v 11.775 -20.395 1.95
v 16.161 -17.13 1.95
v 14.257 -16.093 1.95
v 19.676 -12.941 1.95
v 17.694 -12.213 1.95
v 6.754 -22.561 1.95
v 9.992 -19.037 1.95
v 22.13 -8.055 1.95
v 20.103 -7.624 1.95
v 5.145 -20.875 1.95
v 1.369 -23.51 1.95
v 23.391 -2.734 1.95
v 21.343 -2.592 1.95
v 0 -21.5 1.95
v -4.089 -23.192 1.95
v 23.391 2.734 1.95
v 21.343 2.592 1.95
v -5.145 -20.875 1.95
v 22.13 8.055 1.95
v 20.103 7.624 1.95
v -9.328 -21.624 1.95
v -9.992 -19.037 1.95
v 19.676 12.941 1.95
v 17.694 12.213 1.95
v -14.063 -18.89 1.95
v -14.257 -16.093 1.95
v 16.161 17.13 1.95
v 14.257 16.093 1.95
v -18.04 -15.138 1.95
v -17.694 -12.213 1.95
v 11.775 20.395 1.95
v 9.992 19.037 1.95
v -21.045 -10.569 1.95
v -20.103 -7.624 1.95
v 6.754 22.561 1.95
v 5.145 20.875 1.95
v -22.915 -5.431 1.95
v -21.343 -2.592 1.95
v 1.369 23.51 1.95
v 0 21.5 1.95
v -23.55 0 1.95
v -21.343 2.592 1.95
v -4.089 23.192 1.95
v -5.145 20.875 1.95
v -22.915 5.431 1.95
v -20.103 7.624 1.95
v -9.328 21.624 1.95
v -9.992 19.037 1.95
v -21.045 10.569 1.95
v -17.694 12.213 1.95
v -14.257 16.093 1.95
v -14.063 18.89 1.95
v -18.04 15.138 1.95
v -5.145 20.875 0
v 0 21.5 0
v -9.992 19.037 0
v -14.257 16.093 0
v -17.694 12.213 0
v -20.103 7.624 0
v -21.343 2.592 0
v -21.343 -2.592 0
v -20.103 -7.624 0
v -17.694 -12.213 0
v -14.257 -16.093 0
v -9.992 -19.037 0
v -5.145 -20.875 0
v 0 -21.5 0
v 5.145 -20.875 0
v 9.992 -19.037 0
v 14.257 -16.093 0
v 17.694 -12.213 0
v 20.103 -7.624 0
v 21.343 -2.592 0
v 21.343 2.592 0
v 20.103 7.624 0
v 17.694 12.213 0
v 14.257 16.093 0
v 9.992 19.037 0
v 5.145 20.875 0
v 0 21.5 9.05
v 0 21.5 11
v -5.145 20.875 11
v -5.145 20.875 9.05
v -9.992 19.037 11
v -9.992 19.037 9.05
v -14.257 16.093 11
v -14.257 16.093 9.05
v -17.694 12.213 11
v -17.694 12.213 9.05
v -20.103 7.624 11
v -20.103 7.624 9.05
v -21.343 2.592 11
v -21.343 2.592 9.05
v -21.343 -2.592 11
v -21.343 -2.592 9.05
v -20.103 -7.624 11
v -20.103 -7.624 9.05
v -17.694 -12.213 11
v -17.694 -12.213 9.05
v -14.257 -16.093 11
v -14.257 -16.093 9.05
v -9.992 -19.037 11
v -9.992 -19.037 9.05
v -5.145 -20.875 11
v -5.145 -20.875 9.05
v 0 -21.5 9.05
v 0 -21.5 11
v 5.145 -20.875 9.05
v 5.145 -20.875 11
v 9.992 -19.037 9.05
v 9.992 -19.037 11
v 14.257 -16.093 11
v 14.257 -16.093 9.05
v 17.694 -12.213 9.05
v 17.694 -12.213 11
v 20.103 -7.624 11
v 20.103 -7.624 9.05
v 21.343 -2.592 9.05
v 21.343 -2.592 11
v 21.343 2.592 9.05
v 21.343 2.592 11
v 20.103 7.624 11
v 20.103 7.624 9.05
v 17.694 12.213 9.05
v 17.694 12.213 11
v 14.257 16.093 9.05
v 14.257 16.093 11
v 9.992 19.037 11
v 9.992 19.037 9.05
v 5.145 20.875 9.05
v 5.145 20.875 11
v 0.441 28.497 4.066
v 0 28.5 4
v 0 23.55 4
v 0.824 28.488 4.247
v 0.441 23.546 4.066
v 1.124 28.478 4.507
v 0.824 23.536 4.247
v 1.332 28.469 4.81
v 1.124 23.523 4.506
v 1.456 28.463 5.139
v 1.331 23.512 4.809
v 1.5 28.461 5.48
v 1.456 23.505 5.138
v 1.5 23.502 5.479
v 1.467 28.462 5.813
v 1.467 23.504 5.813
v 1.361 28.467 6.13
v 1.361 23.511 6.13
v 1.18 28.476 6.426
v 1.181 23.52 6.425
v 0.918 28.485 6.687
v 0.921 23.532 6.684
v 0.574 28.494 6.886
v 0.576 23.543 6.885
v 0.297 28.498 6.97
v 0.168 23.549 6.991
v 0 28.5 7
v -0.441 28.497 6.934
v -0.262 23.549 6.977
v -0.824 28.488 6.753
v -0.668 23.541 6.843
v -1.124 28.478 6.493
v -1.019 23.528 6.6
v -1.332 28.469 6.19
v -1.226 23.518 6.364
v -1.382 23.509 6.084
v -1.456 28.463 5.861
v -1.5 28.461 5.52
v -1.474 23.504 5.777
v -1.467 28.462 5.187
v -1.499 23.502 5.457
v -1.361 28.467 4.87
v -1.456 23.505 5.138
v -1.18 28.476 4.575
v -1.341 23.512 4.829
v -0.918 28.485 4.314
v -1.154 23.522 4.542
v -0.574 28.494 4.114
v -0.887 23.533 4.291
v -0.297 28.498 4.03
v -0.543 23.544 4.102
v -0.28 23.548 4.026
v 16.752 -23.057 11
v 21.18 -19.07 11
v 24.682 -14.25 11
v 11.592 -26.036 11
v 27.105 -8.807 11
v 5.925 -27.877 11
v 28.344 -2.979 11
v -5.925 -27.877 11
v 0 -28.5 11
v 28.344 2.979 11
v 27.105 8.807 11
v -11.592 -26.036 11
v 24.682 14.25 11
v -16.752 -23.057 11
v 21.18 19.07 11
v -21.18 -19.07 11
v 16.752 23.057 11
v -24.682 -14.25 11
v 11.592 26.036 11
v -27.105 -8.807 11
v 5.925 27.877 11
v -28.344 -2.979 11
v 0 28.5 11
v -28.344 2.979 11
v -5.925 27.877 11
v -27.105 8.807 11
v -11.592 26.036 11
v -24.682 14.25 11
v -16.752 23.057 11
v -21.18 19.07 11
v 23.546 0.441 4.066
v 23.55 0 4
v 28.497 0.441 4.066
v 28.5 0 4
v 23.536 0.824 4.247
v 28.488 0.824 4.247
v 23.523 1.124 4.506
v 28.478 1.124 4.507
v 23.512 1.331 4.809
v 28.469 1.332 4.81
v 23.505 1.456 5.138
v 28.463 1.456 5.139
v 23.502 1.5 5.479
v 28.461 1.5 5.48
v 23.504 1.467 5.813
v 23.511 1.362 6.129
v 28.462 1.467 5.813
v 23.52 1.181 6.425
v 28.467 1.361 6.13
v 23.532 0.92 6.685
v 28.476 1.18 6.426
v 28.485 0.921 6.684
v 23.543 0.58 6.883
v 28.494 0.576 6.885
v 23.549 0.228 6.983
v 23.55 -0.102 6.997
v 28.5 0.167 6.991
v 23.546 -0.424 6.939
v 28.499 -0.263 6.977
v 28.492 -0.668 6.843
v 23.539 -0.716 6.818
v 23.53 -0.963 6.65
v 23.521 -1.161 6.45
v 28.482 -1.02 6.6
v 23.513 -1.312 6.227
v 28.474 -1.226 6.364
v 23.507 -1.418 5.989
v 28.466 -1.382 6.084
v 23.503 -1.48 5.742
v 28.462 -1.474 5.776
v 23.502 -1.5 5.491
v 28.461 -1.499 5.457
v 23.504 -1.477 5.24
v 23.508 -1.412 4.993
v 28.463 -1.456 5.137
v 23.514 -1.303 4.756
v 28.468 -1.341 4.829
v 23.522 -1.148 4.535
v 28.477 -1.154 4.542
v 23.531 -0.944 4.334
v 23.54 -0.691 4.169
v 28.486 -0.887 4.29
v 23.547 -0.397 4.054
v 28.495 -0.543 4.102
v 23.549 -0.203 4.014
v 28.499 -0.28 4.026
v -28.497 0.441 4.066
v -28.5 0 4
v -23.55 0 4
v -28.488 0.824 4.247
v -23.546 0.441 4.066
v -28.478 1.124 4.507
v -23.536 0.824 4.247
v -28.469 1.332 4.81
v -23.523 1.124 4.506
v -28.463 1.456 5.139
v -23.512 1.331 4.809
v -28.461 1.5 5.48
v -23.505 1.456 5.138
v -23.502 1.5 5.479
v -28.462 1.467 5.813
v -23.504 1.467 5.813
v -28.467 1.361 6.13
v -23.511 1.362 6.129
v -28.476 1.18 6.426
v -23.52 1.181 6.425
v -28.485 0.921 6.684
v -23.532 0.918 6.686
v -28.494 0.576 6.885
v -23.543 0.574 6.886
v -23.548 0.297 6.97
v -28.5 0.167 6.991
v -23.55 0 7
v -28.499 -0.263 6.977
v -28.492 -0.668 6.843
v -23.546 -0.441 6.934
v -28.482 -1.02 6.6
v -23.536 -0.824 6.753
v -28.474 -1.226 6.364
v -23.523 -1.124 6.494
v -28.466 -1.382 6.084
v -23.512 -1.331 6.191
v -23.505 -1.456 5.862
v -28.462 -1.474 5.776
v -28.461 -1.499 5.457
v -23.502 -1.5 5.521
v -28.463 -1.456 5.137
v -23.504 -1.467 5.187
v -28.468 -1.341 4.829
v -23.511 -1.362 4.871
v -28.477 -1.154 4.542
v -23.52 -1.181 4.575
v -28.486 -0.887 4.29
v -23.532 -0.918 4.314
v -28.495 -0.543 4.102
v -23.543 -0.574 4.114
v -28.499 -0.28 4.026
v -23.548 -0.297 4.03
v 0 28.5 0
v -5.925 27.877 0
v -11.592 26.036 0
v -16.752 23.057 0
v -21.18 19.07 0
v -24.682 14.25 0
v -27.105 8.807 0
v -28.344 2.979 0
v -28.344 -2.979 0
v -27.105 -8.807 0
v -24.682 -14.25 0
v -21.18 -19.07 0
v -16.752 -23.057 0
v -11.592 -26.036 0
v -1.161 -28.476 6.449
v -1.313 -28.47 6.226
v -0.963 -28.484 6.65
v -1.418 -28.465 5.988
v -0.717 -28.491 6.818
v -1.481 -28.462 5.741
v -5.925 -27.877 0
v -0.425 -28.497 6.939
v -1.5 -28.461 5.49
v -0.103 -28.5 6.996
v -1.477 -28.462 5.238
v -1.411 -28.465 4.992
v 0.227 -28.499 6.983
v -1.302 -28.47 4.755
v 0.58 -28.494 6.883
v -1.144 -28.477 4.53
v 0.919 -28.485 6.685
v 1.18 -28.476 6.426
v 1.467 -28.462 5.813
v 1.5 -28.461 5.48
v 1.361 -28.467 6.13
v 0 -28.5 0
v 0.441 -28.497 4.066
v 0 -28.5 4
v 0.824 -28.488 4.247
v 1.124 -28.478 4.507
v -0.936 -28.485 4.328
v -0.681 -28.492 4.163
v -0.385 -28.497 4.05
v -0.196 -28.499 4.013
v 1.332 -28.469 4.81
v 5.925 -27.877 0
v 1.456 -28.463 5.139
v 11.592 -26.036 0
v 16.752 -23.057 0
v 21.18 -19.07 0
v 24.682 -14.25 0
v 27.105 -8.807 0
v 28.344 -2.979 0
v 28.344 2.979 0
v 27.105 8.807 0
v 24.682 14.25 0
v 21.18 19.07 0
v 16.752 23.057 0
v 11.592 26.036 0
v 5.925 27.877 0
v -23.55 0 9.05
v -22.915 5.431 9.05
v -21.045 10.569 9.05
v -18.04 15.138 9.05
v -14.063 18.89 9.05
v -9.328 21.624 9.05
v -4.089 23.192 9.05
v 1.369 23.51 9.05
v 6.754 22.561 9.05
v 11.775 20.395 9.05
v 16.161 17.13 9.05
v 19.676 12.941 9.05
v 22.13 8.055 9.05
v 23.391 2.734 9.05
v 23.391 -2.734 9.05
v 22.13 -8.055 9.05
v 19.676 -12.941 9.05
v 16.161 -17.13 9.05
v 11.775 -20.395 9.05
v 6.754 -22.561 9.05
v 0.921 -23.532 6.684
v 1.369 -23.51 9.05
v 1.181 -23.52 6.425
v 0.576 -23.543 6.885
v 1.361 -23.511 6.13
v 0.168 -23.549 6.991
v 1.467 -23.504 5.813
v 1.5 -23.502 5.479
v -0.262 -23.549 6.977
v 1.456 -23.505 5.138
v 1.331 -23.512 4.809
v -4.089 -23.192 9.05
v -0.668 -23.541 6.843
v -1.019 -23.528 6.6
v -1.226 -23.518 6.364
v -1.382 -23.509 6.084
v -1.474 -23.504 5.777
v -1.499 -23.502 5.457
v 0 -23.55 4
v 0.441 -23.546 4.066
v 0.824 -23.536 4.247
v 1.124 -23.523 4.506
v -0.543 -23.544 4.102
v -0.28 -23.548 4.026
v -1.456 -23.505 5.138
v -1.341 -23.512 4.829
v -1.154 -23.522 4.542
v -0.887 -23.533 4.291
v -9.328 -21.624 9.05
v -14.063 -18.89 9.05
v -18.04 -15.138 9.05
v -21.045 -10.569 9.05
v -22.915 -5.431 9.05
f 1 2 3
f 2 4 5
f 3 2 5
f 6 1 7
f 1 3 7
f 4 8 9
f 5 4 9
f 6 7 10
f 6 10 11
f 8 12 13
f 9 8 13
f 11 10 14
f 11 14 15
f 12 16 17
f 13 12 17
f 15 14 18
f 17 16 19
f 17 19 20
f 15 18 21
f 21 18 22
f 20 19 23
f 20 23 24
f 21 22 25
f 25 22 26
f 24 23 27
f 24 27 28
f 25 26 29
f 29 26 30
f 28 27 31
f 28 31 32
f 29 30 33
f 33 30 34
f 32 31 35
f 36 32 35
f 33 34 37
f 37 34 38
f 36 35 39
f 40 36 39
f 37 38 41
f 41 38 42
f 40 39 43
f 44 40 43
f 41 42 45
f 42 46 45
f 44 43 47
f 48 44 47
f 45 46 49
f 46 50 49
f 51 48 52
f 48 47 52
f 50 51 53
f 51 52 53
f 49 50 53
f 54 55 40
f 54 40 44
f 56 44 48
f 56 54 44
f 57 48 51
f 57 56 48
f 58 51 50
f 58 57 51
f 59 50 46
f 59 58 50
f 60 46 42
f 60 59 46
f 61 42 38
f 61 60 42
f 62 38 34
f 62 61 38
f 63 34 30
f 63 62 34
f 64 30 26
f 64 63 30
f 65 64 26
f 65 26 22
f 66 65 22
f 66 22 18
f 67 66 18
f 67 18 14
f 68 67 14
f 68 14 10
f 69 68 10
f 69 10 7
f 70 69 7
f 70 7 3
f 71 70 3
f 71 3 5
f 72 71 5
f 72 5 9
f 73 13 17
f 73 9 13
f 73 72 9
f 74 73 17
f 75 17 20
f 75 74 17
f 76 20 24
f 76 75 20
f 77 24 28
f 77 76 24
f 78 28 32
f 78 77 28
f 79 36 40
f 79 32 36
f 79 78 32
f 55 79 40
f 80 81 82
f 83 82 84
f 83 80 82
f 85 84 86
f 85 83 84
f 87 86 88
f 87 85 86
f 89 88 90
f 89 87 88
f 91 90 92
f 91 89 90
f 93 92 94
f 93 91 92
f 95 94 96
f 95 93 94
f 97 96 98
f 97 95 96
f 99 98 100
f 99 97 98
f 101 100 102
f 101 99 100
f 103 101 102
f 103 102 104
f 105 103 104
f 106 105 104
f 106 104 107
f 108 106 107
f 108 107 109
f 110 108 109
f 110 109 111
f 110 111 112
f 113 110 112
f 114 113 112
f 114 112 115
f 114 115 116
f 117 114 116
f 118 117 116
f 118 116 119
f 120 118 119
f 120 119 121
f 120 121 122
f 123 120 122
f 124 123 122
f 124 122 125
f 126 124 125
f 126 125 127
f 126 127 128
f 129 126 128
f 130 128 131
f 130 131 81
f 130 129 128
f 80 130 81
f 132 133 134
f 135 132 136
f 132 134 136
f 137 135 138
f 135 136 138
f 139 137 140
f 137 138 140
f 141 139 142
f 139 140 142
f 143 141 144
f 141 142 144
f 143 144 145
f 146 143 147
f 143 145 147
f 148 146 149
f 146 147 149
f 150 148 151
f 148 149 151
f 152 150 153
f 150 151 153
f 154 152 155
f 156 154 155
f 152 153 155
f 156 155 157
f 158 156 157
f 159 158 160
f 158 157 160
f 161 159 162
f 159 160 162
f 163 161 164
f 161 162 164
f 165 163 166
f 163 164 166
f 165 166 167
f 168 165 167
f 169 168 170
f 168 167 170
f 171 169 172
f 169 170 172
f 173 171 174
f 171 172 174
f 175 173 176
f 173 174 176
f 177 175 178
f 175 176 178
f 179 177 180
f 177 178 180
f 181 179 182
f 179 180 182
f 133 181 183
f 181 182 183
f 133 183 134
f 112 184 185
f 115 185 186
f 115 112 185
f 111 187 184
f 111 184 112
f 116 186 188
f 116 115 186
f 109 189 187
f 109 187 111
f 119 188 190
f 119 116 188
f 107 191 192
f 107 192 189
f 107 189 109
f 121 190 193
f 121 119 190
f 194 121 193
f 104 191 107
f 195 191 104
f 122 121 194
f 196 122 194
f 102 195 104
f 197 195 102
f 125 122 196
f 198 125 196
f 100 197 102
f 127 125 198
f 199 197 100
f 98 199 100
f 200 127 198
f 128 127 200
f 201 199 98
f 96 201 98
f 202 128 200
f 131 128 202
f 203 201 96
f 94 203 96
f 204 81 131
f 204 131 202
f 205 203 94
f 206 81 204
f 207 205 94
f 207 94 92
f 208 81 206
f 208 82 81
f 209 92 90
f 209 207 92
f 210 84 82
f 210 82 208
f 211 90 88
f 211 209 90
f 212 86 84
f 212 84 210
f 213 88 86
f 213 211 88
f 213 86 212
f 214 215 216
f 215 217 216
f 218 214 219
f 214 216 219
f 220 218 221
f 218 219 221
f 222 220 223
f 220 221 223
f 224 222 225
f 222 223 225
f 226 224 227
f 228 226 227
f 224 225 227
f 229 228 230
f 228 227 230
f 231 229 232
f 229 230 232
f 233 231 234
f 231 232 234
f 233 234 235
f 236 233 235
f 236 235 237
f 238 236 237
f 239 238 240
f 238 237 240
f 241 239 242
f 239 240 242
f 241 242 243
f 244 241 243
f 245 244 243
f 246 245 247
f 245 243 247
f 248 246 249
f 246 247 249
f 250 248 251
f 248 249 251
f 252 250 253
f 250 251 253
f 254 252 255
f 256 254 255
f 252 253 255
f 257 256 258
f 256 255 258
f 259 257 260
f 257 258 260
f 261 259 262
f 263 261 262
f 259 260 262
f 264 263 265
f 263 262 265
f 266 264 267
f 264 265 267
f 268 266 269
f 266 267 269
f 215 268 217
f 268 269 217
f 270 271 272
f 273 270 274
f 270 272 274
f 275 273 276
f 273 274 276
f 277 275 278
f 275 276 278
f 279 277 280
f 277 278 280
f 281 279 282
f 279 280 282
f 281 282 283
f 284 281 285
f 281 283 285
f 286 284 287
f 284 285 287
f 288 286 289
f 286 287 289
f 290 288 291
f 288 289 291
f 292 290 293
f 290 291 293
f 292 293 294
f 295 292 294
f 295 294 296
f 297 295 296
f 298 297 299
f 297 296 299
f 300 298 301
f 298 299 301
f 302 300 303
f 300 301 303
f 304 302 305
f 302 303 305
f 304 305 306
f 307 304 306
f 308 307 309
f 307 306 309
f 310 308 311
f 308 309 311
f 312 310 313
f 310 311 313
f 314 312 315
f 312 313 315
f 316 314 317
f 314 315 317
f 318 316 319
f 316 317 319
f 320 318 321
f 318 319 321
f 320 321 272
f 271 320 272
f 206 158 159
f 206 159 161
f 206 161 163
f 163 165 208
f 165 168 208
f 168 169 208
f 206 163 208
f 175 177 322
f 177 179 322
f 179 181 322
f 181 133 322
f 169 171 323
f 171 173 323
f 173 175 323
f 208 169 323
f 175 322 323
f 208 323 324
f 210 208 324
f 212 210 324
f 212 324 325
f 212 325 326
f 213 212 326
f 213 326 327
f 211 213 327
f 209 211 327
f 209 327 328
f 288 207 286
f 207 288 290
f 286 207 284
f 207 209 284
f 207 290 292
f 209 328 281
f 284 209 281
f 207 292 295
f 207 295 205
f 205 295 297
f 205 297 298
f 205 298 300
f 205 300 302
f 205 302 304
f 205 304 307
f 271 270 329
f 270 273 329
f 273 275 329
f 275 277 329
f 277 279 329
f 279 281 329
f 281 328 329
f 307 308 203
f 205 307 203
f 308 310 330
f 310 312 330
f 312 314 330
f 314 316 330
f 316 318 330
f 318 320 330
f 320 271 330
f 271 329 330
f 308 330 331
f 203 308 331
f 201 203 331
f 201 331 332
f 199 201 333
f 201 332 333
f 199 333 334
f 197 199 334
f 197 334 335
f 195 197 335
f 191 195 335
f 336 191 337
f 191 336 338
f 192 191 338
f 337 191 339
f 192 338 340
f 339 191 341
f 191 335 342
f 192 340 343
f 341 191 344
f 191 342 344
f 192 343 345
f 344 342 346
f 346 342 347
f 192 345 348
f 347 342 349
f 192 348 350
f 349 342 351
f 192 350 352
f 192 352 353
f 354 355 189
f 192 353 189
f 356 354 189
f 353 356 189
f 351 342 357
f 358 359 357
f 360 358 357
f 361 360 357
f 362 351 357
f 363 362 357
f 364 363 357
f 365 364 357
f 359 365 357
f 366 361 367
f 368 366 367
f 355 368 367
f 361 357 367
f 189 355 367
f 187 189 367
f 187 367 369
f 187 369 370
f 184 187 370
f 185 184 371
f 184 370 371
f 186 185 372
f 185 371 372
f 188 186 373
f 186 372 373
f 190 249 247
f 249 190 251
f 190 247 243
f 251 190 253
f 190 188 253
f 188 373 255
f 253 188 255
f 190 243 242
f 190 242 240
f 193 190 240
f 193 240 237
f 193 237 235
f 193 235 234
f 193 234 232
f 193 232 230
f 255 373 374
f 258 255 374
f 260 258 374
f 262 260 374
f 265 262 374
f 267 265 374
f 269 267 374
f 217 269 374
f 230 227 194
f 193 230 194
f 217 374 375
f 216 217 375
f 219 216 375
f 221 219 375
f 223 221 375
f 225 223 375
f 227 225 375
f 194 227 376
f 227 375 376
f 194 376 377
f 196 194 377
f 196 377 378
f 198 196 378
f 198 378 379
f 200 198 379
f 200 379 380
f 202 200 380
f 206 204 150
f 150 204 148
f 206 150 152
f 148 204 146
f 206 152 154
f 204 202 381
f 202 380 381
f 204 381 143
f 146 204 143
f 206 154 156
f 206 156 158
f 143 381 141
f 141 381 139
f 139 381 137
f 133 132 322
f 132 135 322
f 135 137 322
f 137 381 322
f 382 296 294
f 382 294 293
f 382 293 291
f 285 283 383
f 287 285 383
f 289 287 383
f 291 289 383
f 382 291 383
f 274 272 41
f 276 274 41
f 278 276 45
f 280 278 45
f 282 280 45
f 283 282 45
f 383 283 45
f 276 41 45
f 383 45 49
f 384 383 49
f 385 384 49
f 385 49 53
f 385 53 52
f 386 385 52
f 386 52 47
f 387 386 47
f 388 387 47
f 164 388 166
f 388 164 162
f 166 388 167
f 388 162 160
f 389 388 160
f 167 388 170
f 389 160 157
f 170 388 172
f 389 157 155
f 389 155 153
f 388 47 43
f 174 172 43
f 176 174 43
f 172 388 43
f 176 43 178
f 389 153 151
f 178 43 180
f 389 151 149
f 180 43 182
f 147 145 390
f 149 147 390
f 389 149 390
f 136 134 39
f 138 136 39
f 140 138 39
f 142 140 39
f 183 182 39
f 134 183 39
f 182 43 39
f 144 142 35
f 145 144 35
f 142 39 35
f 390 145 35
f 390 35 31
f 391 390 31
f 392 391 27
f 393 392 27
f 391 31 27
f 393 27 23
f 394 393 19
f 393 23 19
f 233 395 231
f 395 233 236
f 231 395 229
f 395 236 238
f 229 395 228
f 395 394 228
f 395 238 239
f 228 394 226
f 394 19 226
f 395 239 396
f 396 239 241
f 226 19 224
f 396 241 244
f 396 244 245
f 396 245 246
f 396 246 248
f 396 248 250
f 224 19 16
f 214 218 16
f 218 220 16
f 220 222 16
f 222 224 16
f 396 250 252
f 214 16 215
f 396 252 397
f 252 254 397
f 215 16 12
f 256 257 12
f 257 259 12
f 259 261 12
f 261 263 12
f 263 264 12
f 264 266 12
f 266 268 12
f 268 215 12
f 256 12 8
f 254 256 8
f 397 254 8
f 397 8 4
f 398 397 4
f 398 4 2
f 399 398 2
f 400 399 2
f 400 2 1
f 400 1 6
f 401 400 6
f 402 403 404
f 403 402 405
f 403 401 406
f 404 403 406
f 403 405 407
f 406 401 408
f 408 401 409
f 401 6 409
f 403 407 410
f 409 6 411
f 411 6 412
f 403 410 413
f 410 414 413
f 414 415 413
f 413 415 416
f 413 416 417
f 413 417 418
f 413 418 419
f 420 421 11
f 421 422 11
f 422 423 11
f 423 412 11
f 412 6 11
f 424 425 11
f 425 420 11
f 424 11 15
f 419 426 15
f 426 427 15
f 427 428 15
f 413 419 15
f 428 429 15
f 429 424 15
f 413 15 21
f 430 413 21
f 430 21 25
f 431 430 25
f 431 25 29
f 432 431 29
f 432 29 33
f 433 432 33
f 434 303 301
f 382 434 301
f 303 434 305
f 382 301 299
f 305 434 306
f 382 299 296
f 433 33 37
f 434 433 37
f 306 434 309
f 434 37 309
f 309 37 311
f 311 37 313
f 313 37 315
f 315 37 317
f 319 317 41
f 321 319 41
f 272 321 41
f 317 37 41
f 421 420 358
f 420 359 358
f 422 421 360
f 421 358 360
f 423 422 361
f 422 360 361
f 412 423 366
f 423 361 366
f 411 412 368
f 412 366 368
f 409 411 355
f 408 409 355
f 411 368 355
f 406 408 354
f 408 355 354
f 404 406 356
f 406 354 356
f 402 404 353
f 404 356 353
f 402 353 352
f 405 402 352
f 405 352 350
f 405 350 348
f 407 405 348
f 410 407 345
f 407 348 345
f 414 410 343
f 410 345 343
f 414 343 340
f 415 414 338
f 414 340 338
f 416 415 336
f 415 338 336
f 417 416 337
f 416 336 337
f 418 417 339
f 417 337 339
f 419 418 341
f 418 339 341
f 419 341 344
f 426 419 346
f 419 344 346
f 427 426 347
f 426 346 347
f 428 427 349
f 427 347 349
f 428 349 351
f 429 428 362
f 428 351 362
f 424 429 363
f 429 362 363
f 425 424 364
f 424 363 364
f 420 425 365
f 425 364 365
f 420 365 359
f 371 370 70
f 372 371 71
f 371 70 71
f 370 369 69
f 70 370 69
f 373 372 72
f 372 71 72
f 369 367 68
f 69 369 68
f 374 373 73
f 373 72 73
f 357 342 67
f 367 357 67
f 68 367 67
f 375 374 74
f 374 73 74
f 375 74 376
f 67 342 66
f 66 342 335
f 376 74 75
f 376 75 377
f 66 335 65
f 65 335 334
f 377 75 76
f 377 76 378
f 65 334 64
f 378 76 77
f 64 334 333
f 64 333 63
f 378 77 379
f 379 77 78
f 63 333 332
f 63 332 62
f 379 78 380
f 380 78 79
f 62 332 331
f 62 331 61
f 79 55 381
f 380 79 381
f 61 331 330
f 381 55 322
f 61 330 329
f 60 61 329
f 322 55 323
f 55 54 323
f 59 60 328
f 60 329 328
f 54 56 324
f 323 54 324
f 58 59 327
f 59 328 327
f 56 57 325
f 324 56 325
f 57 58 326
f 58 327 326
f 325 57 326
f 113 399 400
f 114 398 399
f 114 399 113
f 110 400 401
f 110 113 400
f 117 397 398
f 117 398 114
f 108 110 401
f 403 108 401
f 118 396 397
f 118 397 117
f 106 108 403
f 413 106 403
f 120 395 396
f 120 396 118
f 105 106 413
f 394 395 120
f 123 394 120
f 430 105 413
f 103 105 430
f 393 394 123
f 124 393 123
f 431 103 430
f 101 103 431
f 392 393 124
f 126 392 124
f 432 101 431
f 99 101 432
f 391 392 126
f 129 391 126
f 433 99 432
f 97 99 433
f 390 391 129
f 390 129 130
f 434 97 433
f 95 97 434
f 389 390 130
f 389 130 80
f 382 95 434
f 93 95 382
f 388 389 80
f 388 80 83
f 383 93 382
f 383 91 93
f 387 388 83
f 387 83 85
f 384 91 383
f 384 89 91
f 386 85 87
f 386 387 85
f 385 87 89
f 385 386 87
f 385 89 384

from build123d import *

# Parameters (mm, degrees)
SKETCH1_R           = 28.5
SKETCH1_R_2         = 21.5
EXTRUDE_THIN1_DEPTH = 11
CUT_EXTRUDE1_START  = -1.95
SKETCH2_R           = 23.55
CUT_EXTRUDE1_DEPTH  = 7.1
SKETCH3_R           = 1.5
CUT_EXTRUDE2_DEPTH  = 42.779181419
CIRPATTERN1_COUNT   = 2
CIRPATTERN1_ANGLE   = 90


with BuildPart() as part:
    # Sketch1 → Extrude-Thin1 (new body)
    with BuildSketch(Plane(origin=(0, 0, 0), x_dir=(0, 1, 0), z_dir=(0, 0, 1))):
        Circle(SKETCH1_R)
        Circle(SKETCH1_R_2, mode=Mode.SUBTRACT)
    extrude(amount=EXTRUDE_THIN1_DEPTH)

    # Sketch2 → Cut-Extrude1 (cut)
    with BuildSketch(Plane(origin=(0, 0, 0), x_dir=(1, 0, 0), z_dir=(0, 0, -1)).offset(CUT_EXTRUDE1_START)):
        with Locations(Location((0, 0, 0), (0, 0, 180))):
            Circle(SKETCH2_R)
    extrude(amount=-CUT_EXTRUDE1_DEPTH, mode=Mode.SUBTRACT)

    # Sketch3 → Cut-Extrude2 (cut, symmetric)
    with BuildSketch(Plane.YZ):
        with Locations(Location((0, 5.5, 0), (0, 0, 270))):
            Circle(SKETCH3_R)
    cut_extrude2 = extrude(amount=CUT_EXTRUDE2_DEPTH, both=True, mode=Mode.SUBTRACT)

    # CirPattern1: Cut-Extrude2 ×2 about axis
    cirpattern1_axis = Axis((0, 0, 9.05), (0, 0, -1))
    for i in range(1, CIRPATTERN1_COUNT):
        add(cut_extrude2.rotate(cirpattern1_axis, i * CIRPATTERN1_ANGLE / (CIRPATTERN1_COUNT - 1)), mode=Mode.SUBTRACT)


solid = part.part
